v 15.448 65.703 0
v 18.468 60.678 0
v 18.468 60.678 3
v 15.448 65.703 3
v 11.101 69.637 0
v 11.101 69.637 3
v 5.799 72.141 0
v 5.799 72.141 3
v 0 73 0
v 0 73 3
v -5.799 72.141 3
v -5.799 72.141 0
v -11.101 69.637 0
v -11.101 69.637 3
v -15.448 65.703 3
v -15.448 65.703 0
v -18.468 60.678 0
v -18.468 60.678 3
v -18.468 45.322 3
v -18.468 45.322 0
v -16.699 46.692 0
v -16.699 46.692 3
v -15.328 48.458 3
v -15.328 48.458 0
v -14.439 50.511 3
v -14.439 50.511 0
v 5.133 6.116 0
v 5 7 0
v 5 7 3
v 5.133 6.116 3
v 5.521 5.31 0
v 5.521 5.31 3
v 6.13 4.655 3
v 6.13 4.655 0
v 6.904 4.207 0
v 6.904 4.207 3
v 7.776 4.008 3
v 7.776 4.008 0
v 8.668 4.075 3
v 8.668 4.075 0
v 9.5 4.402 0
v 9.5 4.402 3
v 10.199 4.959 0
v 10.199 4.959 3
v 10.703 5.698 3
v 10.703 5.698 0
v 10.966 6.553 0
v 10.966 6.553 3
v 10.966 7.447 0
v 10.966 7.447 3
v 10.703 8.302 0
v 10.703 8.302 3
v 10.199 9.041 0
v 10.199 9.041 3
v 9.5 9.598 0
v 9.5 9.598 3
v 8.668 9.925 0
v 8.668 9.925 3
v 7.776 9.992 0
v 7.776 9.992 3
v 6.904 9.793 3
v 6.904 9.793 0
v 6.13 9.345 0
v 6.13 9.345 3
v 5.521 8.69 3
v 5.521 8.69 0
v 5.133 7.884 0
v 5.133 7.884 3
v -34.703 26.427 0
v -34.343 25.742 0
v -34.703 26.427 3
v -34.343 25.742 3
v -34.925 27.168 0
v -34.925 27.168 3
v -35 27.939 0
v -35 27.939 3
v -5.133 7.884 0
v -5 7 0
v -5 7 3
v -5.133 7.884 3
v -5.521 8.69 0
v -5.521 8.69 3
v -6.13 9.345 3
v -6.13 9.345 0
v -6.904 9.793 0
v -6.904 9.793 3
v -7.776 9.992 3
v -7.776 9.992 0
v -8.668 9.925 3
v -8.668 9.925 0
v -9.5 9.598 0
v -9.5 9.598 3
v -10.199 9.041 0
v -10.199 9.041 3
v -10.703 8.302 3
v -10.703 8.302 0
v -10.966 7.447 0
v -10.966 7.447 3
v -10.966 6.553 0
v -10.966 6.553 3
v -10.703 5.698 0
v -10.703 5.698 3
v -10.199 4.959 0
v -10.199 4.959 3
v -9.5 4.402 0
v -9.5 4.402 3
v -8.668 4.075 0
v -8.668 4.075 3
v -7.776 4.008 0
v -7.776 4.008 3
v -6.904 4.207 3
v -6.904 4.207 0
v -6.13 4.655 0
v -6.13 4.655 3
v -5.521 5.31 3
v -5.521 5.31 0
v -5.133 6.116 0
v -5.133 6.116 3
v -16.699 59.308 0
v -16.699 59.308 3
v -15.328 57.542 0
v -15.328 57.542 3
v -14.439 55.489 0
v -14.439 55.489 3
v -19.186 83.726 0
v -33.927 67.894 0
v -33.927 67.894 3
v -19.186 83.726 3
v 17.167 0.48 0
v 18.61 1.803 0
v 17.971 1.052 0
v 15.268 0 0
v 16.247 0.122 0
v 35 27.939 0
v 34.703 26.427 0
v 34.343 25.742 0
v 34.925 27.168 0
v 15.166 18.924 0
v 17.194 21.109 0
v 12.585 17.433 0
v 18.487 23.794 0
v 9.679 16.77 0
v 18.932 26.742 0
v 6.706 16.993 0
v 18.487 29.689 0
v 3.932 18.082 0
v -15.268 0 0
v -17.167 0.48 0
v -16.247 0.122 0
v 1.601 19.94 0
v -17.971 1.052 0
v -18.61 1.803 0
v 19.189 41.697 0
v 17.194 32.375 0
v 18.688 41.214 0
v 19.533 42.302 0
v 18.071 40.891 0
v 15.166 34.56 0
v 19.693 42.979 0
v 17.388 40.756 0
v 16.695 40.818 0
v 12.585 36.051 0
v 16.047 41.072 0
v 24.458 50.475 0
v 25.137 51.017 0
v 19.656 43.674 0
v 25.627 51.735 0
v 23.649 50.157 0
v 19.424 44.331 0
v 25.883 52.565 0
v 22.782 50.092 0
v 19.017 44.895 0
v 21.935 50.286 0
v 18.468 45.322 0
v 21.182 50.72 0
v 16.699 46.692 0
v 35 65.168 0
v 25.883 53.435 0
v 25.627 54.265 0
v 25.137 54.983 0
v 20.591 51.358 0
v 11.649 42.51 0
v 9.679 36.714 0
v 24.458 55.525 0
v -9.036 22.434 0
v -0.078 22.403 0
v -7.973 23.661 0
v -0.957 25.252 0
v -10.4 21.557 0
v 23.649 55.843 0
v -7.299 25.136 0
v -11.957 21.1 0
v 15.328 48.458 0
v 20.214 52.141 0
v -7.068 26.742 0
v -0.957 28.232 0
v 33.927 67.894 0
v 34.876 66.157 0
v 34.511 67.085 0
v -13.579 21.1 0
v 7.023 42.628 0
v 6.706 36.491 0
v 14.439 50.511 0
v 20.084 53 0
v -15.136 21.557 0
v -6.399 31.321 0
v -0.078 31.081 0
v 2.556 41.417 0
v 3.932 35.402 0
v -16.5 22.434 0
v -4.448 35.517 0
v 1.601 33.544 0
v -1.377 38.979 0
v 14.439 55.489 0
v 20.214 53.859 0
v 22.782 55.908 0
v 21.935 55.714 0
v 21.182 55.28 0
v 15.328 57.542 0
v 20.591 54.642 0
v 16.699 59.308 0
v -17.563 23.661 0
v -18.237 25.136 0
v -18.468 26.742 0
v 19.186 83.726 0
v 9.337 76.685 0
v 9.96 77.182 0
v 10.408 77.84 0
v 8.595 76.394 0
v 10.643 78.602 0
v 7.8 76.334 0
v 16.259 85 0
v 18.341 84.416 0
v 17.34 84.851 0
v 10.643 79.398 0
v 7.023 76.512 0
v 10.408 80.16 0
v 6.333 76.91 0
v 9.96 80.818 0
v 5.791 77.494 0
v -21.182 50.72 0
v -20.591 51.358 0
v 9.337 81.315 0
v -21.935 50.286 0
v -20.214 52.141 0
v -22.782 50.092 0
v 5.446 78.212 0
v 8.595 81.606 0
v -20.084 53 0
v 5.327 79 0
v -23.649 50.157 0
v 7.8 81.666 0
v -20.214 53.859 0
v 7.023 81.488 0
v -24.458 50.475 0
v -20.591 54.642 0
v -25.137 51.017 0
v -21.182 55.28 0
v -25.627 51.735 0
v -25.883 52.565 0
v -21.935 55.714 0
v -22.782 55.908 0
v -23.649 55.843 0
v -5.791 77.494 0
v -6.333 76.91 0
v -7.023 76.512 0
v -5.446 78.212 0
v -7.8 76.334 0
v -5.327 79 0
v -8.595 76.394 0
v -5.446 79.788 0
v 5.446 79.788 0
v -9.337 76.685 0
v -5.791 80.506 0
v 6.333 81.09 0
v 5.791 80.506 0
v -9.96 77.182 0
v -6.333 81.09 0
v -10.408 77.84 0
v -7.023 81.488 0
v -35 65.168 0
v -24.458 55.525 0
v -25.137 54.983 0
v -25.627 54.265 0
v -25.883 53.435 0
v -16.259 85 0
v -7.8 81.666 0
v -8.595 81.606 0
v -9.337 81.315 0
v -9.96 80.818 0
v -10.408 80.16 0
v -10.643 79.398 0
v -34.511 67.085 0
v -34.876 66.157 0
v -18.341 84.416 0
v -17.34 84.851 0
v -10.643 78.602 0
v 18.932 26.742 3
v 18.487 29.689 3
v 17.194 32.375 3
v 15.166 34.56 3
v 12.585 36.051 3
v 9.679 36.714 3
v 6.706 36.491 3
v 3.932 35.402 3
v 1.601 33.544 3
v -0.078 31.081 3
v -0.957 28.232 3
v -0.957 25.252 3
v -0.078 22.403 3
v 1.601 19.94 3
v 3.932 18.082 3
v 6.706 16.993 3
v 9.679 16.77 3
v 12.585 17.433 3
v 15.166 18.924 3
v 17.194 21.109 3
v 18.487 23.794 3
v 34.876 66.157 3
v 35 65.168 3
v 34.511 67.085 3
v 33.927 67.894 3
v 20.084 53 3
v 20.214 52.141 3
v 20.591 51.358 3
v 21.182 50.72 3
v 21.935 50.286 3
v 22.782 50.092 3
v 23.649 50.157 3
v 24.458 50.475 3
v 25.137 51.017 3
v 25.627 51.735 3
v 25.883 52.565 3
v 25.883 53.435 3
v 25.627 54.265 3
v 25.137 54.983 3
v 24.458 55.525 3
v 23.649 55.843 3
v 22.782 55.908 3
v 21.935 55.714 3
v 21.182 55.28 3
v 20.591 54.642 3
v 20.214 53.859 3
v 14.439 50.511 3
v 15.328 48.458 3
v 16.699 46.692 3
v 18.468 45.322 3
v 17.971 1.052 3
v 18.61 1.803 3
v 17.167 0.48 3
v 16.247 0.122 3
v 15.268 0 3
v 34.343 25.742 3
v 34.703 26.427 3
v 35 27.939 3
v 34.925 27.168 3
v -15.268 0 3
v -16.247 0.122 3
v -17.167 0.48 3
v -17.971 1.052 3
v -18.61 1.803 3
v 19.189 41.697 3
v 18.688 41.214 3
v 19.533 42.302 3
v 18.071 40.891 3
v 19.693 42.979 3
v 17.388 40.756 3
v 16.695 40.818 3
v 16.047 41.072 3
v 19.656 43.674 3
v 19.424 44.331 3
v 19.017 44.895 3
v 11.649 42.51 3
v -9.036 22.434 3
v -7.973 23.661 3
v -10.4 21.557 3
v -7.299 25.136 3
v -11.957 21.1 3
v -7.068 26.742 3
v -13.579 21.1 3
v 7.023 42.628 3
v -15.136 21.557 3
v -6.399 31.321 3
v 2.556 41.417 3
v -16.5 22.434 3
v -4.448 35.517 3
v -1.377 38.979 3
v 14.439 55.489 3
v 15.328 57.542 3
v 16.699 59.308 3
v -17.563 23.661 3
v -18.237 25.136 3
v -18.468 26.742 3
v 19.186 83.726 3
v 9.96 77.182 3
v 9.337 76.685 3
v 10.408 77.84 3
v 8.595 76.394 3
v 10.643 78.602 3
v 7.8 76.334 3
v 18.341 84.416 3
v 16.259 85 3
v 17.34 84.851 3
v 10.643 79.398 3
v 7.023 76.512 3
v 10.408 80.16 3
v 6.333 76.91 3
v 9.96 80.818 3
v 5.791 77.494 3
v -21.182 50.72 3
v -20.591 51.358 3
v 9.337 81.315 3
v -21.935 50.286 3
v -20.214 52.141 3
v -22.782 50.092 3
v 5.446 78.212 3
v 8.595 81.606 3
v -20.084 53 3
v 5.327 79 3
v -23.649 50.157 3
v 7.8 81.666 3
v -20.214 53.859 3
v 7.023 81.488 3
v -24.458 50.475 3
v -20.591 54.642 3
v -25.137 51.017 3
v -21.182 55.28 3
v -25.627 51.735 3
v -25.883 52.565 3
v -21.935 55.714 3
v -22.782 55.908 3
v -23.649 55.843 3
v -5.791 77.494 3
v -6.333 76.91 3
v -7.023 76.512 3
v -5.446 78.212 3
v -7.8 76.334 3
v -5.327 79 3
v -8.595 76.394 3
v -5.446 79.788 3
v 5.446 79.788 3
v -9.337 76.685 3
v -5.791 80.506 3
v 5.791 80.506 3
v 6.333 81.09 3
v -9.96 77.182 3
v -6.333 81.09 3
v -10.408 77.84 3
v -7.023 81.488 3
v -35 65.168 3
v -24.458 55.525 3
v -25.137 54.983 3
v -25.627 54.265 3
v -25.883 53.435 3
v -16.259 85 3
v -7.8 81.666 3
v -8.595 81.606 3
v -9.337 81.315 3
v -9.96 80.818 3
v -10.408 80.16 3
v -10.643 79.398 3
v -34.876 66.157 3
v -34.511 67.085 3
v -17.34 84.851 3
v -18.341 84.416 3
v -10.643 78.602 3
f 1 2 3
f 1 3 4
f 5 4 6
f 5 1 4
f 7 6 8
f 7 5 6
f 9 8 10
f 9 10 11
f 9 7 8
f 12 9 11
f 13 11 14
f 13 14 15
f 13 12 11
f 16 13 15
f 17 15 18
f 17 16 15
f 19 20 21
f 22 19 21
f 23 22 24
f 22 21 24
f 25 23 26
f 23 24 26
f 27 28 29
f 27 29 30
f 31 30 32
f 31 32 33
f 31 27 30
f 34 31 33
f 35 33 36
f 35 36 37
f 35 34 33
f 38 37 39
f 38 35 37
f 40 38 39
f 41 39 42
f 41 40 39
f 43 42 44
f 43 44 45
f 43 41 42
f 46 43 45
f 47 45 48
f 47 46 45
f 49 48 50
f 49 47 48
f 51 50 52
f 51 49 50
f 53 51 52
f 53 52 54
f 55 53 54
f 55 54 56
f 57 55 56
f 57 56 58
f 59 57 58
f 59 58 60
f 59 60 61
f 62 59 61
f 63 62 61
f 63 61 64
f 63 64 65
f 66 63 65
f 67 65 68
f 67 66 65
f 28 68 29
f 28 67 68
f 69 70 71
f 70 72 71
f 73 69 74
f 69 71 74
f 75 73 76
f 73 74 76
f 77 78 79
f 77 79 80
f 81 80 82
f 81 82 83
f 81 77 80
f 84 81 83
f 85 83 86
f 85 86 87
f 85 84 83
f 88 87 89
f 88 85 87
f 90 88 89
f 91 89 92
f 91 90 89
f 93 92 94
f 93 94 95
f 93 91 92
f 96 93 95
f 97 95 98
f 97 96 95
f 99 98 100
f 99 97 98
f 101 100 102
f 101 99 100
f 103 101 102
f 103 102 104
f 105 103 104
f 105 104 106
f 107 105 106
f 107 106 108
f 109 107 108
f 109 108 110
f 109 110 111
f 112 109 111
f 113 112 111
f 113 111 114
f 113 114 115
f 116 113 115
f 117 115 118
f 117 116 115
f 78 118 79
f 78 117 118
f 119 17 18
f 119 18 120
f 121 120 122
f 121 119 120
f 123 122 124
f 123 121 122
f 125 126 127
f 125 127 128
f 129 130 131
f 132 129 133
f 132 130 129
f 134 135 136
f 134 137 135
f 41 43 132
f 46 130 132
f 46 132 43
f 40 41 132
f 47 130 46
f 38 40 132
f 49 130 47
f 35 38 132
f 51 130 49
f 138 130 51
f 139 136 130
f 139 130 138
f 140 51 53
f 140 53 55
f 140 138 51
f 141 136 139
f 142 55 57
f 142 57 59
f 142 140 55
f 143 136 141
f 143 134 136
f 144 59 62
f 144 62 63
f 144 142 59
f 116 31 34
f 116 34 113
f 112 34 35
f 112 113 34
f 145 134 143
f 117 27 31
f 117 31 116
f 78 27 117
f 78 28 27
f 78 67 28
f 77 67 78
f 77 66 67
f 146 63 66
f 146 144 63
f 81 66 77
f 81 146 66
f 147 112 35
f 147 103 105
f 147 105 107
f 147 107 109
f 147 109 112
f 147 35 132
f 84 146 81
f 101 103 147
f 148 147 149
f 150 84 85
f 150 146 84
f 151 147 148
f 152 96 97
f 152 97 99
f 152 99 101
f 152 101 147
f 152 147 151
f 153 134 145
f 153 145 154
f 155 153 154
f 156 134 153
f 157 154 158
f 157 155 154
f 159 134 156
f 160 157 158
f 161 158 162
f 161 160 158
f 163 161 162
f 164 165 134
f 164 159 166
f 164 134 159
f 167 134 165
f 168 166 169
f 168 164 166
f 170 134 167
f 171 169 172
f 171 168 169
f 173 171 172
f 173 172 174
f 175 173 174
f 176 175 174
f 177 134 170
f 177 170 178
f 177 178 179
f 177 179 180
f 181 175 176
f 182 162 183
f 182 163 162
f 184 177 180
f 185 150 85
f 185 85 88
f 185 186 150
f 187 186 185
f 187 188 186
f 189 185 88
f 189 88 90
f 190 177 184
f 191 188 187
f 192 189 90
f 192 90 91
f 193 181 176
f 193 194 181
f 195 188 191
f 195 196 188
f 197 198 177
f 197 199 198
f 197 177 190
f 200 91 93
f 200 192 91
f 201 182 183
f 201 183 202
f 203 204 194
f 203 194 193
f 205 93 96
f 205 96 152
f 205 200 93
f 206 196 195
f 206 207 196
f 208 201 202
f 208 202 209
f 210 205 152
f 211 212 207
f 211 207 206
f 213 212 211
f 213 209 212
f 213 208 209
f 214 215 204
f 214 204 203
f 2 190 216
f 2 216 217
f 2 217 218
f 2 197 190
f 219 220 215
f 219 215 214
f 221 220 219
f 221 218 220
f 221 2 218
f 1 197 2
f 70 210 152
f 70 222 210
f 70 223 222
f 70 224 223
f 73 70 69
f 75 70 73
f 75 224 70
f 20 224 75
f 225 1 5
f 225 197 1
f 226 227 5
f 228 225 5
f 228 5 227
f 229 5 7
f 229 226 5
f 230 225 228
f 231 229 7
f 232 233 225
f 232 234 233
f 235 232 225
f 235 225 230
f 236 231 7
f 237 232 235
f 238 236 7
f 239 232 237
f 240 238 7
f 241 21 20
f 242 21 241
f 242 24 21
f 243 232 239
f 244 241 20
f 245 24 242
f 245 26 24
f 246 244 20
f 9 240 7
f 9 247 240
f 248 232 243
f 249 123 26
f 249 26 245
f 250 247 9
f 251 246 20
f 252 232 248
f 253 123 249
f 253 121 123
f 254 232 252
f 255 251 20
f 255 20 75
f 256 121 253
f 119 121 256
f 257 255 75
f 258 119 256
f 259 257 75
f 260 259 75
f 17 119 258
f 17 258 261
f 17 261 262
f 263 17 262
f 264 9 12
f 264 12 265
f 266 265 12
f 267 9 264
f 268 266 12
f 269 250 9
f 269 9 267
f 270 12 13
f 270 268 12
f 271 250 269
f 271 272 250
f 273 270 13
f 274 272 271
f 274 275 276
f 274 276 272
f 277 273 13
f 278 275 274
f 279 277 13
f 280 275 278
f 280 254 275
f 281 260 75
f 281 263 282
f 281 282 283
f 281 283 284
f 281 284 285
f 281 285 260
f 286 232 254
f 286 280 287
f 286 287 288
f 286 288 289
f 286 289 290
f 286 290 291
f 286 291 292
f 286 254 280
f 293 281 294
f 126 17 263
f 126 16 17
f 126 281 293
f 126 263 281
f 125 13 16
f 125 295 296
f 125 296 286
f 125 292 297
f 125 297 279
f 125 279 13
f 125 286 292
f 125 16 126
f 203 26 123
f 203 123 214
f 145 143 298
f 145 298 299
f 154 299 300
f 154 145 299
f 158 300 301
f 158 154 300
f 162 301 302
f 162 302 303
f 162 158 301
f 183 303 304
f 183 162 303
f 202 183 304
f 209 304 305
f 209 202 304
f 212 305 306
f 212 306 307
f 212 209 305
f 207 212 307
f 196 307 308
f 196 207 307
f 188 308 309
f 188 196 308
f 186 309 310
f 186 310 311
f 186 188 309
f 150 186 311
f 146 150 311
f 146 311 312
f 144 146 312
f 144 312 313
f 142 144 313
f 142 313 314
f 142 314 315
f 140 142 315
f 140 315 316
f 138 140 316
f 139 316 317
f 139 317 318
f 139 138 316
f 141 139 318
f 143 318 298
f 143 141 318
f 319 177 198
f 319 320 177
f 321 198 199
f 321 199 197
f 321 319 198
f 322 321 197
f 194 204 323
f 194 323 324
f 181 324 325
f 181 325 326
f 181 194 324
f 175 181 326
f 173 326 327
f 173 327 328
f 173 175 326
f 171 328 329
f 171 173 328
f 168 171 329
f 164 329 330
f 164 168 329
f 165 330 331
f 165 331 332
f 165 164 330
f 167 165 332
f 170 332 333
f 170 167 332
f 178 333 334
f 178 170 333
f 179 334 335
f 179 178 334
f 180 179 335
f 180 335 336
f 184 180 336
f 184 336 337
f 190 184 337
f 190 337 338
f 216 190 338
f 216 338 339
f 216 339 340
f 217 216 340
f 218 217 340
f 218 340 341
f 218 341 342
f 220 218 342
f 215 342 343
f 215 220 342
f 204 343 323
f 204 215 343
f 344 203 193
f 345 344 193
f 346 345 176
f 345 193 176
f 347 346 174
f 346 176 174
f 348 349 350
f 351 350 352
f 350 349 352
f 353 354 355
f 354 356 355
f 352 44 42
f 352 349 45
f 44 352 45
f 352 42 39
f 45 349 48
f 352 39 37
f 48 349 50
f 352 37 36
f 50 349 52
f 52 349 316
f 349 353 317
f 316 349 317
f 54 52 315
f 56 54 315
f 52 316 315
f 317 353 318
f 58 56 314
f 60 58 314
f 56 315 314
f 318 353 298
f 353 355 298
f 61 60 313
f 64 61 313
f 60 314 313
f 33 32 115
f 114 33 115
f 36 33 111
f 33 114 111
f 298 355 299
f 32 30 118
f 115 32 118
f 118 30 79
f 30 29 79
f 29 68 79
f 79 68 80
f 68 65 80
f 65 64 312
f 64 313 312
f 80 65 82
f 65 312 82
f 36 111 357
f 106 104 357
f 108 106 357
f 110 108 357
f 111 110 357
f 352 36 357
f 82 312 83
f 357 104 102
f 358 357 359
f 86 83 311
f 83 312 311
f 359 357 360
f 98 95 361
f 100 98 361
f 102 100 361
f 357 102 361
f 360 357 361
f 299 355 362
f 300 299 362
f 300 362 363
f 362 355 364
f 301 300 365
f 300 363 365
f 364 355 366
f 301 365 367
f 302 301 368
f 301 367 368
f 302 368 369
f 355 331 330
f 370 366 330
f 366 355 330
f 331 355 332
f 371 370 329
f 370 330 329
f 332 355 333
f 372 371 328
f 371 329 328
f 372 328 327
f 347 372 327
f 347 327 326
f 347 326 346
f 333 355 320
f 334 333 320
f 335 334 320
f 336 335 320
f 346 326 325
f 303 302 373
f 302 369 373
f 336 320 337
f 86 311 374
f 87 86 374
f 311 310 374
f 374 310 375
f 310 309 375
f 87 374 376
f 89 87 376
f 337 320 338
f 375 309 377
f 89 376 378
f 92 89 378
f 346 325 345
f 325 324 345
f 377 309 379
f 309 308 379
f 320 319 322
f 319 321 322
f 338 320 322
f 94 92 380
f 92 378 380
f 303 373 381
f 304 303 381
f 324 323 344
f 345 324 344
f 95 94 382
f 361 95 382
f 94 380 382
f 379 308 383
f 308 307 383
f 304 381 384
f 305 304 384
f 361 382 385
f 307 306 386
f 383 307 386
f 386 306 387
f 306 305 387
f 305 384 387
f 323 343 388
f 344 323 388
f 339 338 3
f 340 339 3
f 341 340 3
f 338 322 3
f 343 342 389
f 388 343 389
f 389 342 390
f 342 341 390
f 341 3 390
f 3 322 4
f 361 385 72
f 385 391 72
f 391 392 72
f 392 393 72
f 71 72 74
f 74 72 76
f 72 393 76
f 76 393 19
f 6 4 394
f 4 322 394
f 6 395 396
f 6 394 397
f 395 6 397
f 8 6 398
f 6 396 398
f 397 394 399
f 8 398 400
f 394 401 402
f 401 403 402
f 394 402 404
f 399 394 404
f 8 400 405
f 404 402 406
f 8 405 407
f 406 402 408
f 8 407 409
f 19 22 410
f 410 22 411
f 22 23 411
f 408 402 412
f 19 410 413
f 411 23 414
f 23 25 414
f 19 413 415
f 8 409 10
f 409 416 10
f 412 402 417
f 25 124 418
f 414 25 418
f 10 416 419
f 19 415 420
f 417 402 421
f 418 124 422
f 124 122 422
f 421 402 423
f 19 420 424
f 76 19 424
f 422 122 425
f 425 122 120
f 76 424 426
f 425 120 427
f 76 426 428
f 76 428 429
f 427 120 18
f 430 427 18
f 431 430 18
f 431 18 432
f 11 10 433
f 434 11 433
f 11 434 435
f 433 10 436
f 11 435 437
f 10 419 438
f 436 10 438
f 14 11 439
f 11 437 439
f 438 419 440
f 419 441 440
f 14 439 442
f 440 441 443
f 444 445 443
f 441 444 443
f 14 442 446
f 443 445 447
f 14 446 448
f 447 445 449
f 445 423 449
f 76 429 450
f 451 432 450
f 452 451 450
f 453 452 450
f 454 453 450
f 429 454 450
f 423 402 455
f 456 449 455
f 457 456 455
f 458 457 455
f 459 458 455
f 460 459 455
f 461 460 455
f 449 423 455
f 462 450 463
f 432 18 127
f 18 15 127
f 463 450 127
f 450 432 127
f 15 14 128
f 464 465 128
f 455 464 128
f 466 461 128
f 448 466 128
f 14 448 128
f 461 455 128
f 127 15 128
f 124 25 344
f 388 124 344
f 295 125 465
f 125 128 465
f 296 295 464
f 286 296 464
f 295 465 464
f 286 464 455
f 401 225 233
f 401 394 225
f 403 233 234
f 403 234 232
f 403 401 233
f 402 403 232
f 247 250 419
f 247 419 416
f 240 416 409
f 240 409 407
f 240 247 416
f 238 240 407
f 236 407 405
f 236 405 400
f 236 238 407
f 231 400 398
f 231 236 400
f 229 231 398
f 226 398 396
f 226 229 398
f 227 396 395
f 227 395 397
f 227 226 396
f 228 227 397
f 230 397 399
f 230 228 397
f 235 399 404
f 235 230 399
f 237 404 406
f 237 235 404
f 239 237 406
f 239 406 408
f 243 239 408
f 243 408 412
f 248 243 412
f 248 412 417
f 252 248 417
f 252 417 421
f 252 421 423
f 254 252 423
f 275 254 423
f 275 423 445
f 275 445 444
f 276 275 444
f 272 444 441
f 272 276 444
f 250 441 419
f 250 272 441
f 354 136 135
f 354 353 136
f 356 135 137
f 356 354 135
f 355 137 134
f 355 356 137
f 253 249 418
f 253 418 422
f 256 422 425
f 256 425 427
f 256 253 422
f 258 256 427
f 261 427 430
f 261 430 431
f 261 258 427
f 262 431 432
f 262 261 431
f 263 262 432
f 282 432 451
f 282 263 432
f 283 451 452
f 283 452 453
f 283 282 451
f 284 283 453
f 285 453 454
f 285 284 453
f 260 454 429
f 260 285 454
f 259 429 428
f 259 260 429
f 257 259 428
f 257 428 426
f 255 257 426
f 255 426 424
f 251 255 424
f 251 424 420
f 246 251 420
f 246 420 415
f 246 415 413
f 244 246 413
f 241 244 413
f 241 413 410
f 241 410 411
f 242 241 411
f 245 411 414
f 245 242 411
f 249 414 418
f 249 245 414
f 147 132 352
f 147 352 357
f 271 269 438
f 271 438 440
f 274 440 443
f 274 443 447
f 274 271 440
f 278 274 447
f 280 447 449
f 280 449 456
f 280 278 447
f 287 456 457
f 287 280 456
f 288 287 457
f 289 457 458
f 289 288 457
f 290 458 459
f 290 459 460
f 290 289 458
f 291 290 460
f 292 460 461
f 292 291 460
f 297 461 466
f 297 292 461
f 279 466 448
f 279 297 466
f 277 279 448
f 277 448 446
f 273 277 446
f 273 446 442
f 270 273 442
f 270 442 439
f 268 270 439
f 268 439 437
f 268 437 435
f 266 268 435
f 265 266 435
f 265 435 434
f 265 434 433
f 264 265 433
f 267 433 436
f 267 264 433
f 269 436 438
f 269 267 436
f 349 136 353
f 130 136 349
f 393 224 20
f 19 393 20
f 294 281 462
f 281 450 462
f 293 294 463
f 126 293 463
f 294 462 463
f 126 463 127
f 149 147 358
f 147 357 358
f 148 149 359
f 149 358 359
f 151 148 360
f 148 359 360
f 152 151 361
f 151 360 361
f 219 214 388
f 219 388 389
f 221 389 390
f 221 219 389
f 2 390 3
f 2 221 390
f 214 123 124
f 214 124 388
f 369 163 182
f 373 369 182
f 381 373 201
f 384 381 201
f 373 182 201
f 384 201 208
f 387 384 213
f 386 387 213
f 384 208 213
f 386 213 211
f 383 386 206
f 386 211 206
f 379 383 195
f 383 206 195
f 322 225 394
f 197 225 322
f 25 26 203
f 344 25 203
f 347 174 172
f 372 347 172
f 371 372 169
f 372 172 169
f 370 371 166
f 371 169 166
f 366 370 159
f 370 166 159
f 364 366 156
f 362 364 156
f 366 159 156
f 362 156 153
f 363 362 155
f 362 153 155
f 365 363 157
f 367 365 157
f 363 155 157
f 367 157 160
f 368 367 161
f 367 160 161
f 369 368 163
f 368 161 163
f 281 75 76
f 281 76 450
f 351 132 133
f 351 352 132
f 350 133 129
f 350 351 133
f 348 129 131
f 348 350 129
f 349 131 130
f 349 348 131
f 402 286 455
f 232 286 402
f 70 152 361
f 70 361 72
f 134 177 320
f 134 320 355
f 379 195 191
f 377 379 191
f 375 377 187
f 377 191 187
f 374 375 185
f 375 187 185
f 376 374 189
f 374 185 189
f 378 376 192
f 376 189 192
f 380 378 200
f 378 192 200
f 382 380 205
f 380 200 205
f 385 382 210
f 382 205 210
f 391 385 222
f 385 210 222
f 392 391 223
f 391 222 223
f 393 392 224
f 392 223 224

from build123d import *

# Parameters (mm, degrees)
SKETCH1_R           = 2.915712225
SKETCH1_R_2         = 2.67310125
SKETCH1_R_3         = 3
SKETCH1_R_4         = 10
BOSS_EXTRUDE2_DEPTH = 3
FILLET1_R           = 4


with BuildPart() as part:
    # Sketch1 → Boss-Extrude2 (new body)
    with BuildSketch(Plane.XY):
        Polygon((17.4253449, 0), (-17.4253449, 0), (-35, 26.741942676), (-35, 66.741942676), (-18, 85), (18, 85), (35, 66.741942676), (35, 26.741942676), align=None)
        with Locations((-23, 53)):
            Circle(SKETCH1_R, mode=Mode.SUBTRACT)
        with Locations((-8, 79)):
            Circle(SKETCH1_R_2, mode=Mode.SUBTRACT)
        with Locations((-8, 7)):
            Circle(SKETCH1_R_3, mode=Mode.SUBTRACT)
        with Locations(Location((8, 7, 0), (0, 0, 180))):
            Circle(SKETCH1_R_3, mode=Mode.SUBTRACT)
        with Locations(Location((23, 53, 0), (0, 0, 180))):
            Circle(SKETCH1_R, mode=Mode.SUBTRACT)
        with Locations(Location((8, 79, 0), (0, 0, 180))):
            Circle(SKETCH1_R_2, mode=Mode.SUBTRACT)
        with Locations((8.931523687, 26.741942676)):
            Circle(SKETCH1_R_4, mode=Mode.SUBTRACT)
        with BuildLine():
            Line((-14.43882876, 55.489231101), (14.43882876, 55.489231101))
            ThreePointArc((14.43882876, 55.489231101), (15.957952298, 58.468042486), (18.467610338, 60.677718959))
            ThreePointArc((18.467610338, 60.677718959), (0, 73), (-18.467610338, 60.677718959))
            ThreePointArc((-18.467610338, 60.677718959), (-15.957952298, 58.468042486), (-14.43882876, 55.489231101))
        make_face(mode=Mode.SUBTRACT)
        with BuildLine():
            Line((-14.43882876, 50.510768899), (14.43882876, 50.510768899))
            ThreePointArc((14.43882876, 50.510768899), (15.957952298, 47.531957514), (18.467610338, 45.322281041))
            ThreePointArc((18.467610338, 45.322281041), (19.38241537, 41.987278709), (16.047413038, 41.072473676))
            ThreePointArc((16.047413038, 41.072473676), (0.501050083, 40.340733608), (-7.068476313, 26.741942676))
            ThreePointArc((-7.068476313, 26.741942676), (-12.768043325, 21.042375664), (-18.467610338, 26.741942676))
            Line((-18.467610338, 26.741942676), (-18.467610338, 45.322281041))
            ThreePointArc((-18.467610338, 45.322281041), (-15.957952298, 47.531957514), (-14.43882876, 50.510768899))
        make_face(mode=Mode.SUBTRACT)
    extrude(amount=BOSS_EXTRUDE2_DEPTH)

    # Fillet1
    fillet1_edges = [part.edges().sort_by_distance(p)[0] for p in [
        (-35, 26.741942676, 1.5),
        (-35, 66.741942676, 1.5),
        (-18, 85, 1.5),
        (18, 85, 1.5),
        (35, 66.741942676, 1.5),
        (35, 26.741942676, 1.5),
        (17.4253449, 0, 1.5),
        (-17.4253449, 0, 1.5),
    ]]
    fillet(fillet1_edges, radius=FILLET1_R)


solid = part.part
